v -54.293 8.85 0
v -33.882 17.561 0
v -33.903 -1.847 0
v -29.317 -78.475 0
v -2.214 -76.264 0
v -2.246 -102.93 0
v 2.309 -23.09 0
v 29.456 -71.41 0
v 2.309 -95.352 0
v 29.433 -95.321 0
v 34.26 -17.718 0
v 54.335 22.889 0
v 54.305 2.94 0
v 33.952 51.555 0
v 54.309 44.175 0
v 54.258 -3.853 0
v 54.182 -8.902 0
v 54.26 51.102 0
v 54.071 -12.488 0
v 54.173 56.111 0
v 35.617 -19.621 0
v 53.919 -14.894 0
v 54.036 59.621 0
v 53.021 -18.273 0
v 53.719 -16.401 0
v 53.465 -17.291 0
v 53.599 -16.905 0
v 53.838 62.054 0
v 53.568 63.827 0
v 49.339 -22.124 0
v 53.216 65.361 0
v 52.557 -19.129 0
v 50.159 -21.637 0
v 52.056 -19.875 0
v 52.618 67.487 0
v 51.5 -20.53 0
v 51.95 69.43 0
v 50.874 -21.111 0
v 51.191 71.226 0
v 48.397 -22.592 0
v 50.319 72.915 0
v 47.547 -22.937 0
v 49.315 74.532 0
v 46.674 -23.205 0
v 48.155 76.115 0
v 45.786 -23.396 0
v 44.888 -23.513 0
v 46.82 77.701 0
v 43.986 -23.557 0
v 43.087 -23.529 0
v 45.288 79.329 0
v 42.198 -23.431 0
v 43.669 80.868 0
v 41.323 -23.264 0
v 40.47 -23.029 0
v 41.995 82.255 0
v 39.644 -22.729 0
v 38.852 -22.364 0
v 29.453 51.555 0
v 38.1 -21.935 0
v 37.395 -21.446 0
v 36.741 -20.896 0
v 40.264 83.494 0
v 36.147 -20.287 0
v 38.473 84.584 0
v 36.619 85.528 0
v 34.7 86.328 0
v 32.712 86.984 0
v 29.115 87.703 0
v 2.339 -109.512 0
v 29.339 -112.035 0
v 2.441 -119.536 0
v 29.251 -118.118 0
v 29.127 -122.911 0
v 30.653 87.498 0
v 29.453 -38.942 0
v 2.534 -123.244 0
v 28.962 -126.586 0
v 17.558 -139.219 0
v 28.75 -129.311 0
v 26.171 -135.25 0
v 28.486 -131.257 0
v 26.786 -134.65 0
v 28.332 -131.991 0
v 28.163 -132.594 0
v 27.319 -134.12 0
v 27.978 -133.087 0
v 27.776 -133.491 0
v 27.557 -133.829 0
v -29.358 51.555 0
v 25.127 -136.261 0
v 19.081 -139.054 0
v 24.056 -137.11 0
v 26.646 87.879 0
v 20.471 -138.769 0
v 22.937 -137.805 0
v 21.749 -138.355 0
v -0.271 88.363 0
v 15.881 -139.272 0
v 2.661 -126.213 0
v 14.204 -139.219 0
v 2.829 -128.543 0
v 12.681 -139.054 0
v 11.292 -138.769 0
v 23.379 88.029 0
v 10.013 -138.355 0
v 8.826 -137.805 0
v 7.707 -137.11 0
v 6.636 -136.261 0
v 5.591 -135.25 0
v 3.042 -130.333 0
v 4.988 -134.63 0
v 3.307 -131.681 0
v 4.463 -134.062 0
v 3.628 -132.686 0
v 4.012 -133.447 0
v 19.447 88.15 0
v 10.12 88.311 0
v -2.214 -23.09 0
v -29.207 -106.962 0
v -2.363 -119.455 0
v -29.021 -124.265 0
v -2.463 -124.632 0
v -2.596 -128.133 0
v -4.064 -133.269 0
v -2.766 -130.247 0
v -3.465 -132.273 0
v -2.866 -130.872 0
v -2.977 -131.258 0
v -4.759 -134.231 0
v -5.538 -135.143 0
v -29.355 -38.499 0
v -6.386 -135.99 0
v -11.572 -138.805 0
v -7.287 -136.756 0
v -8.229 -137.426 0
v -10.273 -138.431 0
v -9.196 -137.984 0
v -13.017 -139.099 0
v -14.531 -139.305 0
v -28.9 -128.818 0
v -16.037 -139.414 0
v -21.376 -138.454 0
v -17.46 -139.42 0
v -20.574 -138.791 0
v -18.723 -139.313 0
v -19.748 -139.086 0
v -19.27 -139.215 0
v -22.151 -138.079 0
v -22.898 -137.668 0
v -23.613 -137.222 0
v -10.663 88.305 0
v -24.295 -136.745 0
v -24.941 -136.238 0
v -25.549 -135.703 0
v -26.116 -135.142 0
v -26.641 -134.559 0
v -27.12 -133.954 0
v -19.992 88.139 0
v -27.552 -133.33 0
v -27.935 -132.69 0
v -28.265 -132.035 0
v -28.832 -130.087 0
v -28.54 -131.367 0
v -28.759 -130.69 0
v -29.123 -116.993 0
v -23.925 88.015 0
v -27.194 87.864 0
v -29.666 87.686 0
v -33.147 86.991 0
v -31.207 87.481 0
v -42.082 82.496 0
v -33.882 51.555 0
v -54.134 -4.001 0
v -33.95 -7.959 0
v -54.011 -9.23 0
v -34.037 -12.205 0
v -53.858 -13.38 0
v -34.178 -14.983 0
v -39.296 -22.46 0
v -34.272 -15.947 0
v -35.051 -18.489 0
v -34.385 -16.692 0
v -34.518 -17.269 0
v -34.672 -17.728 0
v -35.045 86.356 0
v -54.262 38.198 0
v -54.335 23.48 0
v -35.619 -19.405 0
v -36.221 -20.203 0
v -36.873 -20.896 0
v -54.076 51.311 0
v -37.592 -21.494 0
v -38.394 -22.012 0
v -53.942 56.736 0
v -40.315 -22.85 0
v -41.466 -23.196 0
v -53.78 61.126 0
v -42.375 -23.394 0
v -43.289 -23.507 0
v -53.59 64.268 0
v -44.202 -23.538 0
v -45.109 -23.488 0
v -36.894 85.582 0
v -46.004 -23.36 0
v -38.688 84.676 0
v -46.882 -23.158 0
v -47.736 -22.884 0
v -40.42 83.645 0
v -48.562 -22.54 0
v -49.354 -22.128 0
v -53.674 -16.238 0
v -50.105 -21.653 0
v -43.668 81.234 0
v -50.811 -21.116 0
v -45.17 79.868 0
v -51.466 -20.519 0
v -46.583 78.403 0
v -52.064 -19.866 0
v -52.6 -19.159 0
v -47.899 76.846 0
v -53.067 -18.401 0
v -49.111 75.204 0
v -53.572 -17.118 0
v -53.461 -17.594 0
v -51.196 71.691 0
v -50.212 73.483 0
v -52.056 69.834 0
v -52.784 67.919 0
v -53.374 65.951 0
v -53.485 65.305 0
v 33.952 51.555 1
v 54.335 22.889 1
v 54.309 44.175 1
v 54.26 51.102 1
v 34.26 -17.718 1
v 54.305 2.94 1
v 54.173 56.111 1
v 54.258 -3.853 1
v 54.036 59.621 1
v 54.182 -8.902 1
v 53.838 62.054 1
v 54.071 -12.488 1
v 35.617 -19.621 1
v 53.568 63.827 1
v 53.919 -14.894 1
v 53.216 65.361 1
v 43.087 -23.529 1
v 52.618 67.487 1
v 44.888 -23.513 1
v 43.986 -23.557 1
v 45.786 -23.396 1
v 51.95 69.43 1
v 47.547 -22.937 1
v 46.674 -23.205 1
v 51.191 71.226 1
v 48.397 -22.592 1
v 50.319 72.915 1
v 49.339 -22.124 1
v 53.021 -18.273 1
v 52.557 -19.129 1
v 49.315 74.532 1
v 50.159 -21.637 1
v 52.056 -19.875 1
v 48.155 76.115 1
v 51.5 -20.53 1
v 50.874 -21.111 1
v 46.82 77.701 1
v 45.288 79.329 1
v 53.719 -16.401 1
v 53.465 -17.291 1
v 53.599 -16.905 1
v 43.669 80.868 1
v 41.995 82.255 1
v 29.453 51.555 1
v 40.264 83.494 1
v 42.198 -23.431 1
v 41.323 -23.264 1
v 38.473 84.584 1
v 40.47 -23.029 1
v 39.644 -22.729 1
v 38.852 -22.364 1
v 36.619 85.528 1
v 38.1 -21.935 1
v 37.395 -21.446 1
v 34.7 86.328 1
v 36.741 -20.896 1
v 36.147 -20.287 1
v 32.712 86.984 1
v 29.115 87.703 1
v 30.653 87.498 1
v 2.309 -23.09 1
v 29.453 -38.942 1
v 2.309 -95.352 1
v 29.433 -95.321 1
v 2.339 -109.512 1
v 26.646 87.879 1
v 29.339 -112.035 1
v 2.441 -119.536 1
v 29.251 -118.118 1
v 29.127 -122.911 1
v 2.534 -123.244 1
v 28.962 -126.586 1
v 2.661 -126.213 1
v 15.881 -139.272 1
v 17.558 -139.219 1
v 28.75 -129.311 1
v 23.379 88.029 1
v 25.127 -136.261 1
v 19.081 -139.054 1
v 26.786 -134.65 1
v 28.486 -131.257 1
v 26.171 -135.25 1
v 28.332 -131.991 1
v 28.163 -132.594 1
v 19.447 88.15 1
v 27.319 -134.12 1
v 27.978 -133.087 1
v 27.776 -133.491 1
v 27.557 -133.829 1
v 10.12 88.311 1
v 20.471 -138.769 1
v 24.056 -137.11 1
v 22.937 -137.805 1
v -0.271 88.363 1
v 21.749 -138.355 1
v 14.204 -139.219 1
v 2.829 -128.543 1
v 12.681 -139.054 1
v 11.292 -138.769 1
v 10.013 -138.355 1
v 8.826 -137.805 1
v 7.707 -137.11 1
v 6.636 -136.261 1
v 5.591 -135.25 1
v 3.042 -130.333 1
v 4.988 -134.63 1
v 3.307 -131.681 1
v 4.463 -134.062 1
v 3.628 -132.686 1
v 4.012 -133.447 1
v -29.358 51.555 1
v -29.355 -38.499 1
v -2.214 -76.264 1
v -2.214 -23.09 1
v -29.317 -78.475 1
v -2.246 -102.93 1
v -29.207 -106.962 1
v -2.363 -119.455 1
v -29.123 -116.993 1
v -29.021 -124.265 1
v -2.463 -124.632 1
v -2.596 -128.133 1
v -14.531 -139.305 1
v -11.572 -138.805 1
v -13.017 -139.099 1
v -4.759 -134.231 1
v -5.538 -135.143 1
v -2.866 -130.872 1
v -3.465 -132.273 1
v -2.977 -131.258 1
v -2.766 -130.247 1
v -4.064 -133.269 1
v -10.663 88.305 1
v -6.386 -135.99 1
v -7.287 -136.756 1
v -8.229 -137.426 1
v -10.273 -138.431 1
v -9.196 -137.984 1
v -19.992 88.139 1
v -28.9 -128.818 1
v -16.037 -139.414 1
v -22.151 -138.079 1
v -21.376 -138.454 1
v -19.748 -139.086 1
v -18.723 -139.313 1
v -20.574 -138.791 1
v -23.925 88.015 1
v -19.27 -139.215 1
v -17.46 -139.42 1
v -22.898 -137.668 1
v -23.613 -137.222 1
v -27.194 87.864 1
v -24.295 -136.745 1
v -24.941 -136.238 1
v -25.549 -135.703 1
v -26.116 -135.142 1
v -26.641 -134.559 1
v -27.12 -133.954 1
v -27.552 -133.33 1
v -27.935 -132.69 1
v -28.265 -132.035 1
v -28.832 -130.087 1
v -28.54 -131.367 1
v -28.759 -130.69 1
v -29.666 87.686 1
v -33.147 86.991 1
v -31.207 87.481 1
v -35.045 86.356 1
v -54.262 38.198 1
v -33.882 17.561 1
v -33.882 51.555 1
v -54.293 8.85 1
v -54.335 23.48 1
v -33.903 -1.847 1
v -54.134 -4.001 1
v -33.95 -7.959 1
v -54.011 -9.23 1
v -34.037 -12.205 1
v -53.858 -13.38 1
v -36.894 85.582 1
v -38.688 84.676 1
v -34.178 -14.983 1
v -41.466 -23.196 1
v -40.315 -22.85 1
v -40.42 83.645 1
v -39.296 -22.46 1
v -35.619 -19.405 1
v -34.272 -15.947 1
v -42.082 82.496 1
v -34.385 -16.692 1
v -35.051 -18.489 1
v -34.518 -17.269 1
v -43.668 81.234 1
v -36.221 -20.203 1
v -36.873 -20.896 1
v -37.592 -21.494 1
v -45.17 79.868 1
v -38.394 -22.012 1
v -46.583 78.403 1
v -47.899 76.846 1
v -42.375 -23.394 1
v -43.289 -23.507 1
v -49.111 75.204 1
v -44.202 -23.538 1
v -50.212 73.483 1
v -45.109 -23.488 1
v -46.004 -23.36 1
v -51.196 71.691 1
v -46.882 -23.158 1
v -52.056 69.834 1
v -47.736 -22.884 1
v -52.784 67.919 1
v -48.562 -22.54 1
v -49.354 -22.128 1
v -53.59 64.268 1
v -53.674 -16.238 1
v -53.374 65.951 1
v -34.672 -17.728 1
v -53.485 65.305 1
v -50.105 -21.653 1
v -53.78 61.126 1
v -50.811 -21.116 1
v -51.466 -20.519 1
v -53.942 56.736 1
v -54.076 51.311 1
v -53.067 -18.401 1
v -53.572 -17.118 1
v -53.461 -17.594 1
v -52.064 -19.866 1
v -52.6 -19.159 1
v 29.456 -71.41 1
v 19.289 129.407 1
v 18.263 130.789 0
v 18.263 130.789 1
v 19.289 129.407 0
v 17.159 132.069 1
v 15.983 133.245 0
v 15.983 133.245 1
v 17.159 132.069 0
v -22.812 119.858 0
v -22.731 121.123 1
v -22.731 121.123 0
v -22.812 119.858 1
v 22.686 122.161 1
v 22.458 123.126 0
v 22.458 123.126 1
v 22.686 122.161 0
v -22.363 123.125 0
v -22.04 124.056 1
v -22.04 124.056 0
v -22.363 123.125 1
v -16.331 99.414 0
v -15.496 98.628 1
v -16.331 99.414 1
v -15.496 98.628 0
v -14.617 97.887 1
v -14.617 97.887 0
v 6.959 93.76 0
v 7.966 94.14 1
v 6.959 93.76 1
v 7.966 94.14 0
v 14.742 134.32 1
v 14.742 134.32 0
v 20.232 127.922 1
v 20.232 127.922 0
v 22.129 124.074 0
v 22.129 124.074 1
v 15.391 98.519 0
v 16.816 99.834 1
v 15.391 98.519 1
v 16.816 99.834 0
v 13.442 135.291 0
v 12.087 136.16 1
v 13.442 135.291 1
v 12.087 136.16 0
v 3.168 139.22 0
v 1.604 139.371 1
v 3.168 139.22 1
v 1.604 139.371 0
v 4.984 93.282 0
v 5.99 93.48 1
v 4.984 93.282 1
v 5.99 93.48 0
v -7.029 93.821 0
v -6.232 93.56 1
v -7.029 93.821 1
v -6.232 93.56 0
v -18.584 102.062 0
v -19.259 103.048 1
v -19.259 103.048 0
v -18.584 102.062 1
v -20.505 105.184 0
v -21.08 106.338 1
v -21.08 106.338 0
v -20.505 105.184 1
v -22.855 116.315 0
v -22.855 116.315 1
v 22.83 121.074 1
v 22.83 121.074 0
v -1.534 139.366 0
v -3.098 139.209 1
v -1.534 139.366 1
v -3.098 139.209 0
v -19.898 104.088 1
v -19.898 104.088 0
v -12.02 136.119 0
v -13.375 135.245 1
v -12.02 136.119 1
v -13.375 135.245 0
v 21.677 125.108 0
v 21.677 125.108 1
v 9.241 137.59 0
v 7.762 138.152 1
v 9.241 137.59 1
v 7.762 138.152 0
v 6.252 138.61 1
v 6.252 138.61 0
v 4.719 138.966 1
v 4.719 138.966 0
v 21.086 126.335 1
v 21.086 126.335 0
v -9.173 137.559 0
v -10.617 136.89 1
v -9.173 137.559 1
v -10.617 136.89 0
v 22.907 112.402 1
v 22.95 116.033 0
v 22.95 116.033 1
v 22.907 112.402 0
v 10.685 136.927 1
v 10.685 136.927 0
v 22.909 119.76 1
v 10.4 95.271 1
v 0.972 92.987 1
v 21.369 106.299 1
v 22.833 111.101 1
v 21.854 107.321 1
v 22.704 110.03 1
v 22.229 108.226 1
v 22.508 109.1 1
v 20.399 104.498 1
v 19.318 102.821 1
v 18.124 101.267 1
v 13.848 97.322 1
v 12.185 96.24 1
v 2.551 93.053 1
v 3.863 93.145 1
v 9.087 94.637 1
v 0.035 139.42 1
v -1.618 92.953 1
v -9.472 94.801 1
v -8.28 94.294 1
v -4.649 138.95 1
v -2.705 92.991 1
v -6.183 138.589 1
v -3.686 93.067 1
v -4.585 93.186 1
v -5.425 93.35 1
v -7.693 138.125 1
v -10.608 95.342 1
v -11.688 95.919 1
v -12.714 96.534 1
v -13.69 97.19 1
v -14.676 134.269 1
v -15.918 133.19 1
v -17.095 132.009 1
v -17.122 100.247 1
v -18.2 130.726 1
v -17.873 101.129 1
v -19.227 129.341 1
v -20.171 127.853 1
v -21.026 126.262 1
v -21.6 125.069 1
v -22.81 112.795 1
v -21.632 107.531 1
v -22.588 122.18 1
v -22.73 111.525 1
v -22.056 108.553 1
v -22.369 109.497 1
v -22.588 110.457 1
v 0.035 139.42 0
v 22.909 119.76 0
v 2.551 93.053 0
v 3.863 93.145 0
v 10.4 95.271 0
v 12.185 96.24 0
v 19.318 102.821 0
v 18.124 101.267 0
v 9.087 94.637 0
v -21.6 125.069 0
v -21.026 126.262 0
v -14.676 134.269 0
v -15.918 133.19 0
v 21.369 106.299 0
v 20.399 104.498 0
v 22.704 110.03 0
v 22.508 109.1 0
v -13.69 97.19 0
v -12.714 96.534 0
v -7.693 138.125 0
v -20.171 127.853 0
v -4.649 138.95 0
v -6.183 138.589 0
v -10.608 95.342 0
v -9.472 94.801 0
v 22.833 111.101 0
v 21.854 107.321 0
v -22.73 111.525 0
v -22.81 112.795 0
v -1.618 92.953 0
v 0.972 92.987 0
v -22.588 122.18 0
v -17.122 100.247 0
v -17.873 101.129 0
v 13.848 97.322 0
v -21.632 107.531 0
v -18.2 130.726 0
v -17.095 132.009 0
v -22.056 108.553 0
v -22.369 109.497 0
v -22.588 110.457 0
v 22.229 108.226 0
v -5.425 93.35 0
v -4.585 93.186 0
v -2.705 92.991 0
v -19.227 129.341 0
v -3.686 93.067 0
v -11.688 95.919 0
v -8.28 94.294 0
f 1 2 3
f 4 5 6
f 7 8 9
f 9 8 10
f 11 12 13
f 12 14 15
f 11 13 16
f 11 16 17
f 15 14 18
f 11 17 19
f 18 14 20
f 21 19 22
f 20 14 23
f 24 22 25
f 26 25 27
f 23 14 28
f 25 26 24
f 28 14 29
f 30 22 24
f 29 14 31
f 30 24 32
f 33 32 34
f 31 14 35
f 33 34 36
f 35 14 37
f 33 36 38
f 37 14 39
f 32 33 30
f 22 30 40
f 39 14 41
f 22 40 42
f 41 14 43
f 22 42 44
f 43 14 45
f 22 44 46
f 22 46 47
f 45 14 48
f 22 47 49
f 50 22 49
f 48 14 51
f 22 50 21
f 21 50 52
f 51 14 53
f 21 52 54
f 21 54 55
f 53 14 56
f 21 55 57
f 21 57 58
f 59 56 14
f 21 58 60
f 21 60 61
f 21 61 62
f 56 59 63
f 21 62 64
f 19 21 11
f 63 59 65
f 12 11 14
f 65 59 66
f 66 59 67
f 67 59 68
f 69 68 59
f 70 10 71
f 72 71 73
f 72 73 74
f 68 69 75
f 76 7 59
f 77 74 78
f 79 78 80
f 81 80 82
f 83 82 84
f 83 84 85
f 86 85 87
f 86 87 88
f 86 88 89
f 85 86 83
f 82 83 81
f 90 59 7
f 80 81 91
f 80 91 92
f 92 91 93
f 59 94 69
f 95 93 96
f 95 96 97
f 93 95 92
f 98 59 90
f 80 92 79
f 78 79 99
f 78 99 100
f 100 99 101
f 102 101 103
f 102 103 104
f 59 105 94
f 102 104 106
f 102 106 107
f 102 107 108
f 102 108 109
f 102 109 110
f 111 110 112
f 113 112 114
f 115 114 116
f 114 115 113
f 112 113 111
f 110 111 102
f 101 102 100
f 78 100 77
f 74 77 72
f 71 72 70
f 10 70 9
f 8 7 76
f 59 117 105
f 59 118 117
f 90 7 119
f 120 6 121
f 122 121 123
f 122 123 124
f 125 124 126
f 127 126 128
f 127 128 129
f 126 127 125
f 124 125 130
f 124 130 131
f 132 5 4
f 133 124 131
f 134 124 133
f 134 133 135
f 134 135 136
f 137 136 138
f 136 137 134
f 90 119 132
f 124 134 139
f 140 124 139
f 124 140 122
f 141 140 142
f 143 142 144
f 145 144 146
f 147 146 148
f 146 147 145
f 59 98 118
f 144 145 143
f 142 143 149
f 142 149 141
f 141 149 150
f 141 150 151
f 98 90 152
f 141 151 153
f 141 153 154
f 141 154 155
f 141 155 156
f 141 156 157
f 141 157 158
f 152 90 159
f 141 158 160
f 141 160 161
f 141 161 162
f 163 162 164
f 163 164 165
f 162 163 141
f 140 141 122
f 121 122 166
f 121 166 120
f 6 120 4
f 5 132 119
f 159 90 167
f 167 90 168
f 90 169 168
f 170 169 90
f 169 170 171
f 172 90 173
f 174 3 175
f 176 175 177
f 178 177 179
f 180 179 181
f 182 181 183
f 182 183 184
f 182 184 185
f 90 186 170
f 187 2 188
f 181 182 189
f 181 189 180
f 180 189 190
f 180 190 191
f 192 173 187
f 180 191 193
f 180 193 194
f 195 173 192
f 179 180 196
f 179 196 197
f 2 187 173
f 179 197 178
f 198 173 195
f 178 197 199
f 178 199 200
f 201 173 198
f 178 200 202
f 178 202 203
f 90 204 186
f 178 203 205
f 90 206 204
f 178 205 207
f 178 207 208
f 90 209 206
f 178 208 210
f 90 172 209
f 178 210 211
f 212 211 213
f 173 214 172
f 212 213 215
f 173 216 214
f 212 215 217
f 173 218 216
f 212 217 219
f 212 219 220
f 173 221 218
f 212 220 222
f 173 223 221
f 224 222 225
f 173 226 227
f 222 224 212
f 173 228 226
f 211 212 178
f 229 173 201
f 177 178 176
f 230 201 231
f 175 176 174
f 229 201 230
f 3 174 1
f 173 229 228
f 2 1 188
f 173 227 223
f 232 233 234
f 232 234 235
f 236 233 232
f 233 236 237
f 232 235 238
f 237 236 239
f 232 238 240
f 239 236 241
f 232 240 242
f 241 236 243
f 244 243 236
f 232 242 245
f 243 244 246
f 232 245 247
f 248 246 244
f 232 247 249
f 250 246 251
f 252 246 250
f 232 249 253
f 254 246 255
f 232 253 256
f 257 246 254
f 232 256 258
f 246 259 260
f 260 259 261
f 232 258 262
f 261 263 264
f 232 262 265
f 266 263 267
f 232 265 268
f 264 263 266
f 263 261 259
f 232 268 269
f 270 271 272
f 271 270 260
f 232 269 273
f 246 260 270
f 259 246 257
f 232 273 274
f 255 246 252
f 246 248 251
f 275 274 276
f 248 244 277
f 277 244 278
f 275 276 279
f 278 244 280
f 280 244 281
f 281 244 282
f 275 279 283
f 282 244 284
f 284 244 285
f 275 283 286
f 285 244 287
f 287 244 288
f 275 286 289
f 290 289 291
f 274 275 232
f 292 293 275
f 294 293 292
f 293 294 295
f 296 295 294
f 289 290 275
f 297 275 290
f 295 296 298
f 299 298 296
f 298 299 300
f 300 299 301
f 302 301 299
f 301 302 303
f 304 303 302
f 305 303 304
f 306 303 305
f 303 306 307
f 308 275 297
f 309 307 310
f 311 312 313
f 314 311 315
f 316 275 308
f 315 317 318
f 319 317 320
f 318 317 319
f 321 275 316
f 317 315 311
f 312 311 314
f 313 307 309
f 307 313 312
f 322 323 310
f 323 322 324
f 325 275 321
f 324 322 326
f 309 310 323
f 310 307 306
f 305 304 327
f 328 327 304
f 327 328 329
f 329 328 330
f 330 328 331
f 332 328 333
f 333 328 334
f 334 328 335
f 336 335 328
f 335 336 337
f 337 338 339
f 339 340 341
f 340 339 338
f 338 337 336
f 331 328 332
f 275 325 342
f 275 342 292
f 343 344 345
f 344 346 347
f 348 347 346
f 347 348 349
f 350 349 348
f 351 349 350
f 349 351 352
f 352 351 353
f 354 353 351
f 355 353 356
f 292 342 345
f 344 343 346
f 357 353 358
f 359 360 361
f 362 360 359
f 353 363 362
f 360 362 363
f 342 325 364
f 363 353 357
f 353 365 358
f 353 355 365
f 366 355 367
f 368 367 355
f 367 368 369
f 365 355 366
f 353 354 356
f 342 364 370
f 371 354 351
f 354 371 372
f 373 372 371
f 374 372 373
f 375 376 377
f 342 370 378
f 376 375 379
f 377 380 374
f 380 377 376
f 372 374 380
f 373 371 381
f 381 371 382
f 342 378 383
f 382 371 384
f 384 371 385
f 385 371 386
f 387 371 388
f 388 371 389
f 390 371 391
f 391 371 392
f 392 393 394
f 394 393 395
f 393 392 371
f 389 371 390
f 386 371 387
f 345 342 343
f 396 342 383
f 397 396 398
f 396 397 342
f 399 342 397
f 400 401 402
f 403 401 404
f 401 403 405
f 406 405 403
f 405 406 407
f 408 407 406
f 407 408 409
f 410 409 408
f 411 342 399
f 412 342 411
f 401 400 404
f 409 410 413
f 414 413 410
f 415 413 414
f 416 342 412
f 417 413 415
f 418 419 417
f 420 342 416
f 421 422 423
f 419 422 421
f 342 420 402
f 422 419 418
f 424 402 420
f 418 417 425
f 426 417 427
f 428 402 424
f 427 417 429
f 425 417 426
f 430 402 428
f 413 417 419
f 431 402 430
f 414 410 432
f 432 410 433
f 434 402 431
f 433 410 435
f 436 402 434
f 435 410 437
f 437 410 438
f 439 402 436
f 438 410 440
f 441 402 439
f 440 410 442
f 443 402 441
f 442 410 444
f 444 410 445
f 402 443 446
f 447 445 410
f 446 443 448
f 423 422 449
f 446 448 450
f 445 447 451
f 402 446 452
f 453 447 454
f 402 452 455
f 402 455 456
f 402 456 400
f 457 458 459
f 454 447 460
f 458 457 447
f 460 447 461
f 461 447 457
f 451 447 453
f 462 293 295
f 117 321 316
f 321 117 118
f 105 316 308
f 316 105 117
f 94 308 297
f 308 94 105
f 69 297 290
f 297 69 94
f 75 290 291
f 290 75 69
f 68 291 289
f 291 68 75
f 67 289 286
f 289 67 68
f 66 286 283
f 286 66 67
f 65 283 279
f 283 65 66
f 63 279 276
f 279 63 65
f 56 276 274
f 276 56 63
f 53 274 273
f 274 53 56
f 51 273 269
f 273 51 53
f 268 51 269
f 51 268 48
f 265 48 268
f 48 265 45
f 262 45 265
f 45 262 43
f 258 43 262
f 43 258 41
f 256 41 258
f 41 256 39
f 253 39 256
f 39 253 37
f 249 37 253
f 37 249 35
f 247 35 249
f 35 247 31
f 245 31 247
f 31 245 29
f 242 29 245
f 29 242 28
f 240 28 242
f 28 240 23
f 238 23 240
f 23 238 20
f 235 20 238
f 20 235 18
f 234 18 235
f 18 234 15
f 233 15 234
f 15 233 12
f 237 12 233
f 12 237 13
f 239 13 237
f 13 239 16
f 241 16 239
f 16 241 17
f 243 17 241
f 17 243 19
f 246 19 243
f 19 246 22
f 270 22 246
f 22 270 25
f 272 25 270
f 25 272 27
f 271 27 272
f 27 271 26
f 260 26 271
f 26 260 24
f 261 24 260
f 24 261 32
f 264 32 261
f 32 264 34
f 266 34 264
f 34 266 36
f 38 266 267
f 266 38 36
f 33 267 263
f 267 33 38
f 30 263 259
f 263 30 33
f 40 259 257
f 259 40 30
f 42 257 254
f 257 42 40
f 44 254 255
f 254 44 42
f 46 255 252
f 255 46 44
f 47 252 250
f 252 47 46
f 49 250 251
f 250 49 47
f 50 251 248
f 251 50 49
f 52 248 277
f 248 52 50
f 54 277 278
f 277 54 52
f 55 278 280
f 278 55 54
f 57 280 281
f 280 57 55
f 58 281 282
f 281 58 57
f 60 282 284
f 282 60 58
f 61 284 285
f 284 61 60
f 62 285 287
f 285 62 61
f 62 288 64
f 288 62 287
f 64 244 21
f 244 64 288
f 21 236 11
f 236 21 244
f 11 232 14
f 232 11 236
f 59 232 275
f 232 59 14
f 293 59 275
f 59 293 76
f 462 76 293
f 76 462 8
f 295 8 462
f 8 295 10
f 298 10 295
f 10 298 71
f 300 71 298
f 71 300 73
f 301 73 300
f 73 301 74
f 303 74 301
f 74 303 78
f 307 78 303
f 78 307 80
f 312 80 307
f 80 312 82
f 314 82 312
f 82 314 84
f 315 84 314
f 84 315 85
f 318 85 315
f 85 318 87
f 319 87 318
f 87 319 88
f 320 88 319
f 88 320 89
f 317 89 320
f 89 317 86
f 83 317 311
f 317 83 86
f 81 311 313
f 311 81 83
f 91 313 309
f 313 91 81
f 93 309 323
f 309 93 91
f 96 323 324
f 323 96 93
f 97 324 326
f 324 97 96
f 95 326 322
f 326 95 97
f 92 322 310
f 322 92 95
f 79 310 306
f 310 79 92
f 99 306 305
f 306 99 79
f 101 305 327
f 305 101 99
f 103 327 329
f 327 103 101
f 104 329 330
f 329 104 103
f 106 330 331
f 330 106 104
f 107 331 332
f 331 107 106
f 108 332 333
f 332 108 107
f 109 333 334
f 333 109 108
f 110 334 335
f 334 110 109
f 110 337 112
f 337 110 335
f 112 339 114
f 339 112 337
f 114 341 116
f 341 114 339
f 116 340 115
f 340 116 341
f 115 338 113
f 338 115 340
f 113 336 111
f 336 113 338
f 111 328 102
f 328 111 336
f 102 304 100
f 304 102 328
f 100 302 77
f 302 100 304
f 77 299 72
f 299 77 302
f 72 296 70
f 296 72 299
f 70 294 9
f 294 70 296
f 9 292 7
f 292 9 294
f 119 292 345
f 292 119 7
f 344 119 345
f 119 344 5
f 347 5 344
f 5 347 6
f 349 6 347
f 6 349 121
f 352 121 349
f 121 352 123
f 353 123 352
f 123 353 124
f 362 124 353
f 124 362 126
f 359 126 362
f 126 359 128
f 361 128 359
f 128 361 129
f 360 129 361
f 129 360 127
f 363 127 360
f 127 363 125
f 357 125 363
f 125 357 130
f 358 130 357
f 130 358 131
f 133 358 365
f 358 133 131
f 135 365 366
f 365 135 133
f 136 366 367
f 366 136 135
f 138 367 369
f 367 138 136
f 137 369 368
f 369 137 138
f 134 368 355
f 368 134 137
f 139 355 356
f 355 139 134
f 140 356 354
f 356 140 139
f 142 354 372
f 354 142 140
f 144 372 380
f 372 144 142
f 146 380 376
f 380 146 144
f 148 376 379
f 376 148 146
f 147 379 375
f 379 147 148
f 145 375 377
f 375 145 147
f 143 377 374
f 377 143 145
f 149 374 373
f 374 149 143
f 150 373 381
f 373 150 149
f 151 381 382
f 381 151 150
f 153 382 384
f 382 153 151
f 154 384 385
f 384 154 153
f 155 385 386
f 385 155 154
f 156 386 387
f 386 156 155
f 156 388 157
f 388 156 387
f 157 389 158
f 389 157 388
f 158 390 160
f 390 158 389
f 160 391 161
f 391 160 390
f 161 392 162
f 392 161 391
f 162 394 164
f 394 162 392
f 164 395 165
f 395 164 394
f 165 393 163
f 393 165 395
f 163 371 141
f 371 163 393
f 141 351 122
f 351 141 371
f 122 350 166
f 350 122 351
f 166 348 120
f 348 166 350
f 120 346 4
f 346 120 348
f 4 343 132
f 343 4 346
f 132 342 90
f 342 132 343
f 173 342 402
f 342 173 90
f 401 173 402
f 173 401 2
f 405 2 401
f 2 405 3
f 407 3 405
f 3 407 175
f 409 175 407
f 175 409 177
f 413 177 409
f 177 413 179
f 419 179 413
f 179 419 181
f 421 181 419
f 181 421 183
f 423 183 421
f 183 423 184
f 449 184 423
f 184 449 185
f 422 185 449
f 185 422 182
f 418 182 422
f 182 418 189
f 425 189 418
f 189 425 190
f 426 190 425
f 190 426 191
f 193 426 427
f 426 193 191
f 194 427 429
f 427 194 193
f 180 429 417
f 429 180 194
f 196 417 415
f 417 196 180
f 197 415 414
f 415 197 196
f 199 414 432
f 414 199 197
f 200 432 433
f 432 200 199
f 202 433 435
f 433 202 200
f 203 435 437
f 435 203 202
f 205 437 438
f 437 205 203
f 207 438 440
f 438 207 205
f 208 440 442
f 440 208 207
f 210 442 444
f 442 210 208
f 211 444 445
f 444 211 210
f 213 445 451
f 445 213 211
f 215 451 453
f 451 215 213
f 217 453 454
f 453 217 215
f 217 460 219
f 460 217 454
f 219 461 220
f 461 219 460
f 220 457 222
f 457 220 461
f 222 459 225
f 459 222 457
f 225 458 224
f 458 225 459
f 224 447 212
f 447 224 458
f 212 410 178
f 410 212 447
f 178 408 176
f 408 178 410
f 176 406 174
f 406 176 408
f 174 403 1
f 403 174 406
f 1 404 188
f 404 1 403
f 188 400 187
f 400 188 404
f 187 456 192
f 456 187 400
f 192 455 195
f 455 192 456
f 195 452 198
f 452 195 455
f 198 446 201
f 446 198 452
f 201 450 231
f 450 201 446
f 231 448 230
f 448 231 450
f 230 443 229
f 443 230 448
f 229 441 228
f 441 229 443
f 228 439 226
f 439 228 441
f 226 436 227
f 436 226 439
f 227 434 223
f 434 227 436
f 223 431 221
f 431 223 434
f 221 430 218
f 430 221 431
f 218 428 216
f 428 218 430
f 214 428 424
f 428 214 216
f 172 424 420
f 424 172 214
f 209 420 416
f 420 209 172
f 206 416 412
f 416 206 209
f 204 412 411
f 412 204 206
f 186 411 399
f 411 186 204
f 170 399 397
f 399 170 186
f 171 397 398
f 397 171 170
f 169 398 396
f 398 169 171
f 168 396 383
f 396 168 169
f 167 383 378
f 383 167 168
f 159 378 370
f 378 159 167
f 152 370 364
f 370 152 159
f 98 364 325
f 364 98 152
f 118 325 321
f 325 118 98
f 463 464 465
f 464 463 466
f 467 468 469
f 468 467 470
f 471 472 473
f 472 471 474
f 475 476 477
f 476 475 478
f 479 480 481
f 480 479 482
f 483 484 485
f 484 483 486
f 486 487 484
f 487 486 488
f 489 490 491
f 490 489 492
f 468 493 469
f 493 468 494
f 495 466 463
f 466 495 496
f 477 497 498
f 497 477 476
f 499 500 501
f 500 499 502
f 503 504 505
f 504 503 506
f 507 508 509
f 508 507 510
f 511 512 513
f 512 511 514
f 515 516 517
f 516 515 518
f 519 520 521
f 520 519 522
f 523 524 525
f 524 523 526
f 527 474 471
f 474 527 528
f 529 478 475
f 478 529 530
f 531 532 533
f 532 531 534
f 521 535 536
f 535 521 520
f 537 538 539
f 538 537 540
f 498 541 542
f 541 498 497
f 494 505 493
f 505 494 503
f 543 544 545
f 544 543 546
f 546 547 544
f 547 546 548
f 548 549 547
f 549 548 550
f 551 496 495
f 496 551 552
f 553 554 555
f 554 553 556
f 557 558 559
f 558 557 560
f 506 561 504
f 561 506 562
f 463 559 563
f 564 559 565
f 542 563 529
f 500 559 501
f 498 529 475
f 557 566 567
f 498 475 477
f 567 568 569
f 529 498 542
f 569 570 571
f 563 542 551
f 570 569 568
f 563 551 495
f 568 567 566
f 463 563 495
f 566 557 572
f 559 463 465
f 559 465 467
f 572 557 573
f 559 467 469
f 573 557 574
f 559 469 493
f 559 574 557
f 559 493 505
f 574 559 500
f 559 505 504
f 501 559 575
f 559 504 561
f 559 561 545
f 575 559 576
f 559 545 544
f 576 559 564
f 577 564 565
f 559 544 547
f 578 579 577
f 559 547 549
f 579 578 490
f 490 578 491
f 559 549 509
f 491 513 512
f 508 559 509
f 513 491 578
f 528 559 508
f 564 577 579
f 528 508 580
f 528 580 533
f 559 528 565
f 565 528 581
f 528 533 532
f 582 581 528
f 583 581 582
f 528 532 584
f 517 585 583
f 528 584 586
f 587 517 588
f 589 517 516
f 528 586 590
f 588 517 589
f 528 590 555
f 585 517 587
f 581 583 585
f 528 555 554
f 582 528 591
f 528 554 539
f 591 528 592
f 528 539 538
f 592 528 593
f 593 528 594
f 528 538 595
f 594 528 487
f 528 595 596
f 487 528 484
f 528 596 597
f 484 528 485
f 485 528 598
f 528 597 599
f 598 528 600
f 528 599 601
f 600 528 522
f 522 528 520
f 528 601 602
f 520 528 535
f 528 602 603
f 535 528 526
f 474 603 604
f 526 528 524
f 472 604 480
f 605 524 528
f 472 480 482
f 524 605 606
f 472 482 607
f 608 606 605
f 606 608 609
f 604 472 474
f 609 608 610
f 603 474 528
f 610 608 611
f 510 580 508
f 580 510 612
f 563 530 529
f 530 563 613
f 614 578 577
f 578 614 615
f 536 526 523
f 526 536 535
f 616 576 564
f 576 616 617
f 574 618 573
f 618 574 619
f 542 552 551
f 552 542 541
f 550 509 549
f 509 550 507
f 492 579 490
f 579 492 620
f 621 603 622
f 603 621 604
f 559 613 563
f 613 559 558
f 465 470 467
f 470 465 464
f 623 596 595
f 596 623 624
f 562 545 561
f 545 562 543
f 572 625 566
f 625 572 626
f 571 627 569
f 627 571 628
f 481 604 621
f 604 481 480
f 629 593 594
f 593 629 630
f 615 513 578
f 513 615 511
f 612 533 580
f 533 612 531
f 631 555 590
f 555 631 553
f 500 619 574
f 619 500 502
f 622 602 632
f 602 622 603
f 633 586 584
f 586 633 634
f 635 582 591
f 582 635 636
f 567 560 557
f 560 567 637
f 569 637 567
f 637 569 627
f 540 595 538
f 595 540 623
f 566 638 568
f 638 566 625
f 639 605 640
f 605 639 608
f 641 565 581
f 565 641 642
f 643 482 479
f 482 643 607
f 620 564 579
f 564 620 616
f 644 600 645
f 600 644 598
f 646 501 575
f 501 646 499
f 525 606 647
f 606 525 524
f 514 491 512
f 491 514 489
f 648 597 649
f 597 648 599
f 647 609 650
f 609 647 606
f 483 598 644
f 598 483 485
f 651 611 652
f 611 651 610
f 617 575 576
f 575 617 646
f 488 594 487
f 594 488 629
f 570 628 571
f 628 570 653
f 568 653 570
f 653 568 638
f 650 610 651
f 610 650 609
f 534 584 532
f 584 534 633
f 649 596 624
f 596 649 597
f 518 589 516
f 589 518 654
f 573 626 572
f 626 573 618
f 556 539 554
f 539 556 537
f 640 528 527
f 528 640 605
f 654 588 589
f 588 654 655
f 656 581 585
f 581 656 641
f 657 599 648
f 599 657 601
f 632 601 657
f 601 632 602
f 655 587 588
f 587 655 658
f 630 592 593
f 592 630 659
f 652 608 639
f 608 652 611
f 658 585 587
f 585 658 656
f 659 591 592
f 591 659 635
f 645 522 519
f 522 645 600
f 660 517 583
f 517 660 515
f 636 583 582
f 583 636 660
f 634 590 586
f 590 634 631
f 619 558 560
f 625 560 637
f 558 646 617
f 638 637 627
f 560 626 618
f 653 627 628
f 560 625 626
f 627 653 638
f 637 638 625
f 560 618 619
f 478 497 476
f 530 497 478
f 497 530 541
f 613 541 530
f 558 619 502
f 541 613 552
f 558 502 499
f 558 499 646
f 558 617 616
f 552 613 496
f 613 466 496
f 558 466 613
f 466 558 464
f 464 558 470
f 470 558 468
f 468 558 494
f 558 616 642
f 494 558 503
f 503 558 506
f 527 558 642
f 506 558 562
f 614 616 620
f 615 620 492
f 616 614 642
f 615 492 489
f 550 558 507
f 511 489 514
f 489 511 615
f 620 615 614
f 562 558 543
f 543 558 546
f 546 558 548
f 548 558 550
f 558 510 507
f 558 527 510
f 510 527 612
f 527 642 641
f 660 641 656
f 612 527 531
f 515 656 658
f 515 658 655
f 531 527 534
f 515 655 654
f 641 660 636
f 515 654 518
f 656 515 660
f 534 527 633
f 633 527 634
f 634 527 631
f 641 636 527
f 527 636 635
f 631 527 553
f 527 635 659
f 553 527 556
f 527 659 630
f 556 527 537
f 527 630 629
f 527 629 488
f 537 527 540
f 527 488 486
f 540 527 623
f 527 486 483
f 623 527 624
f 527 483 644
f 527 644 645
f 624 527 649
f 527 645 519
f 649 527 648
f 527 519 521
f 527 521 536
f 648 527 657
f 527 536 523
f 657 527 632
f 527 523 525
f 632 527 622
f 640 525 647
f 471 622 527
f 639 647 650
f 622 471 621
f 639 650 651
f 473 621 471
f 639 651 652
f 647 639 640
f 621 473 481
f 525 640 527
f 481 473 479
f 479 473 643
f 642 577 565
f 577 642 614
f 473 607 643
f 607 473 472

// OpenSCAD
// Module names are of the form poly_<inkscape-path-id>().  As a result,
// you can associate a polygon in this OpenSCAD program with the corresponding
// SVG element in the Inkscape document by looking for the XML element with
// the attribute id="inkscape-path-id".

// fudge value is used to ensure that subtracted solids are a tad taller
// in the z dimension than the polygon being subtracted from.  This helps
// keep the resulting .stl file manifold.
fudge = 0.1;

module logo_man(h)
{
  scale([25.4/90, -25.4/90, 1]) union()
  {
    linear_extrude(height=h)
      polygon([[-69.974416,492.826079],[-72.900530,491.778174],[-75.741231,490.586009],[-78.488229,489.257309],[-81.133235,487.799799],[-83.667957,486.221205],[-86.084107,484.529251],[-88.373393,482.731662],[-90.527526,480.836164],[-92.538216,478.850482],[-94.397173,476.782341],[-96.096107,474.639466],[-97.626728,472.429582],[-98.980745,470.160414],[-100.149869,467.839688],[-101.125809,465.475128],[-101.900276,463.074459],[-102.158911,460.938052],[-102.400159,456.443117],[-102.830937,440.310146],[-103.193481,414.540499],[-103.488666,378.999129],[-103.880453,278.061037],[-104.013286,136.415499],[-104.024486,-182.674811],[-112.039316,-182.674811],[-120.054146,-182.674811],[-120.054146,-62.224281],[-120.130342,6.545059],[-120.294116,28.199600],[-120.602588,43.245422],[-121.101444,53.091051],[-121.436543,56.503957],[-121.836370,59.145011],[-122.306636,61.190280],[-122.853052,62.815829],[-124.197176,65.512029],[-126.210062,68.757988],[-128.342289,71.586083],[-130.652538,74.039370],[-133.199486,76.160903],[-136.041813,77.993736],[-139.238196,79.580923],[-142.847314,80.965520],[-146.927846,82.190579],[-150.148364,82.893476],[-153.386494,83.293898],[-156.622342,83.401137],[-159.836013,83.224481],[-163.007614,82.773223],[-166.117251,82.056652],[-169.145028,81.084059],[-172.071053,79.864736],[-174.875429,78.407971],[-177.538264,76.723057],[-180.039663,74.819284],[-182.359731,72.705942],[-184.478575,70.392322],[-186.376300,67.887714],[-188.033012,65.201410],[-189.428816,62.342699],[-189.820289,60.652698],[-190.184902,57.537943],[-190.833945,47.408952],[-191.376727,32.705290],[-191.814032,14.176519],[-192.375343,-31.358092],[-192.524144,-83.198374],[-192.266698,-135.347822],[-191.609272,-181.809927],[-191.132523,-201.034317],[-190.558129,-216.588182],[-189.886873,-227.721958],[-189.515165,-231.397073],[-189.119536,-233.686081],[-187.029216,-240.656474],[-184.449208,-247.443793],[-181.403913,-254.024337],[-177.917731,-260.374407],[-174.015063,-266.470305],[-169.720309,-272.288330],[-165.057871,-277.804783],[-160.052149,-282.995966],[-154.727543,-287.838178],[-149.108455,-292.307720],[-143.219285,-296.380894],[-137.084433,-300.033999],[-130.728301,-303.243337],[-124.175288,-305.985207],[-117.449797,-308.235912],[-110.576226,-309.971751],[-105.115334,-310.698531],[-96.357725,-311.329545],[-84.774455,-311.864660],[-70.836579,-312.303742],[-37.781233,-312.893277],[-0.960133,-313.097086],[35.858277,-312.914102],[68.905550,-312.343262],[82.837371,-311.912063],[94.413240,-311.383500],[103.162103,-310.757440],[108.612904,-310.033751],[115.908630,-308.210732],[122.952236,-305.885723],[129.753512,-303.053259],[136.322245,-299.707876],[142.668225,-295.844110],[148.801241,-291.456496],[154.731081,-286.539571],[160.467534,-281.087871],[165.897583,-275.320168],[170.629110,-269.697730],[174.737315,-264.088070],[178.297397,-258.358704],[181.384557,-252.377147],[184.073995,-246.010912],[186.440911,-239.127515],[188.560504,-231.594471],[189.809334,-226.158547],[190.764583,-219.875122],[191.465417,-211.257156],[191.951000,-198.817608],[192.260499,-181.069437],[192.433079,-156.525603],[192.524144,-81.102781],[192.418054,-10.417982],[192.252992,13.652958],[191.984406,31.542072],[191.590663,44.248720],[191.050129,52.772264],[190.341171,58.112064],[189.916772,59.900359],[189.442154,61.267479],[187.869628,64.747722],[186.225560,67.778382],[184.449707,70.422471],[182.481829,72.742999],[180.261682,74.802977],[177.729025,76.665416],[174.823616,78.393327],[171.485214,80.049719],[168.472387,81.272785],[165.381116,82.221172],[162.233430,82.900001],[159.051360,83.314391],[155.856937,83.469463],[152.672190,83.370339],[149.519151,83.022138],[146.419848,82.429981],[143.396312,81.598988],[140.470573,80.534280],[137.664663,79.240978],[135.000610,77.724202],[132.500446,75.989073],[130.186200,74.040711],[128.079902,71.884236],[126.203584,69.524769],[121.392544,62.779229],[120.846814,-59.947811],[120.301064,-182.674851],[112.331054,-182.674851],[104.361034,-182.674851],[104.361034,137.982599],[104.370941,253.027922],[104.291184,337.751563],[103.957544,396.973072],[103.644199,418.526637],[103.205801,435.511999],[102.621823,448.531604],[101.871737,458.187894],[100.935016,465.083313],[100.390252,467.683960],[99.791132,469.820306],[99.135089,471.567655],[98.419558,473.001315],[97.641973,474.196589],[96.799767,475.228784],[94.911232,477.105158],[92.733424,479.232879],[89.031837,482.813715],[85.236602,485.821412],[81.272245,488.285464],[77.063293,490.235367],[72.534272,491.700615],[67.609709,492.710703],[62.214130,493.295126],[56.272064,493.483379],[50.330000,493.295126],[44.934423,492.710703],[40.009861,491.700615],[35.480840,490.235367],[31.271888,488.285464],[27.307531,485.821412],[23.512297,482.813715],[19.810714,479.232879],[17.672757,477.035108],[15.813799,475.021417],[14.214376,472.841930],[12.855023,470.146769],[11.716276,466.586059],[10.778669,461.809922],[10.022738,455.468482],[9.429019,447.211863],[8.978046,436.690187],[8.650355,423.553578],[8.286959,388.036055],[8.183115,337.860280],[8.183104,270.227239],[8.183104,81.814489],[0.168274,81.814489],[-7.846556,81.814489],[-7.846556,270.227279],[-7.959090,364.711738],[-8.371807,423.266143],[-8.725944,441.608870],[-9.197379,454.016238],[-9.800195,461.503965],[-10.155272,463.720375],[-10.548476,465.087769],[-12.276237,468.684663],[-14.398343,472.214263],[-16.864311,475.621967],[-19.623655,478.853178],[-22.625890,481.853294],[-25.820530,484.567717],[-29.157090,486.941845],[-32.585086,488.921079],[-36.400741,490.502373],[-41.003511,491.827937],[-46.122411,492.869469],[-51.486459,493.598667],[-56.824670,493.987229],[-61.866060,494.006853],[-66.339647,493.629237],[-68.278832,493.282620],[-69.974446,492.826079]]);
    linear_extrude(height=h)
      polygon([[-24.904196,-332.435341],[-29.338653,-334.113436],[-33.563419,-335.907683],[-37.585640,-337.824446],[-41.412461,-339.870089],[-45.051026,-342.050977],[-48.508481,-344.373474],[-51.791969,-346.843945],[-54.908636,-349.468754],[-57.865627,-352.254267],[-60.670086,-355.206846],[-63.329158,-358.332858],[-65.849989,-361.638666],[-68.239722,-365.130635],[-70.505503,-368.815129],[-72.654476,-372.698513],[-74.693786,-376.787151],[-76.647901,-381.015487],[-78.150632,-384.636964],[-79.260798,-387.982290],[-80.037219,-391.382169],[-80.538713,-395.167311],[-80.824100,-399.668420],[-80.981826,-412.141371],[-80.829385,-424.694157],[-80.544142,-429.176647],[-80.035380,-432.921049],[-79.239971,-436.270748],[-78.094788,-439.569131],[-76.536702,-443.159582],[-74.502586,-447.385488],[-71.473787,-453.020679],[-68.128394,-458.293193],[-64.487521,-463.202994],[-60.572287,-467.750043],[-56.403807,-471.934306],[-52.003197,-475.755746],[-47.391575,-479.214326],[-42.590057,-482.310010],[-37.619759,-485.042762],[-32.501797,-487.412544],[-27.257289,-489.419322],[-21.907350,-491.063057],[-16.473098,-492.343714],[-10.975647,-493.261257],[-5.436116,-493.815649],[0.124380,-494.006853],[5.684724,-493.834833],[11.223800,-493.299553],[16.720491,-492.400976],[22.153681,-491.139065],[27.502253,-489.513786],[32.745091,-487.525100],[37.861078,-485.172971],[42.829099,-482.457364],[47.628036,-479.378242],[52.236773,-475.935567],[56.634193,-472.129305],[60.799181,-467.959417],[64.710619,-463.425869],[68.347392,-458.528623],[71.688382,-453.267644],[74.712474,-447.642894],[76.808966,-443.297296],[78.408129,-439.631490],[79.577093,-436.274534],[80.382986,-432.855485],[80.892938,-429.003400],[81.174077,-424.347338],[81.318434,-411.139511],[81.167227,-398.273248],[80.903650,-393.666369],[80.448474,-389.868817],[79.751985,-386.574459],[78.764470,-383.477163],[77.436217,-380.270797],[75.717514,-376.649231],[72.280105,-370.267865],[68.449535,-364.327180],[64.219377,-358.820713],[59.583204,-353.742004],[54.534589,-349.084593],[49.067105,-344.842017],[43.174325,-341.007817],[36.849824,-337.575531],[32.198782,-335.328834],[28.224650,-333.566052],[24.656888,-332.221621],[21.224959,-331.229979],[17.658324,-330.525563],[13.686445,-330.042808],[9.038784,-329.716152],[3.444804,-329.480031],[-5.734058,-329.361254],[-9.586186,-329.493916],[-13.061124,-329.766532],[-16.244634,-330.188042],[-19.222475,-330.767387],[-22.080409,-331.513506],[-24.904196,-332.435341]]);
  }
}

logo_man(1);
